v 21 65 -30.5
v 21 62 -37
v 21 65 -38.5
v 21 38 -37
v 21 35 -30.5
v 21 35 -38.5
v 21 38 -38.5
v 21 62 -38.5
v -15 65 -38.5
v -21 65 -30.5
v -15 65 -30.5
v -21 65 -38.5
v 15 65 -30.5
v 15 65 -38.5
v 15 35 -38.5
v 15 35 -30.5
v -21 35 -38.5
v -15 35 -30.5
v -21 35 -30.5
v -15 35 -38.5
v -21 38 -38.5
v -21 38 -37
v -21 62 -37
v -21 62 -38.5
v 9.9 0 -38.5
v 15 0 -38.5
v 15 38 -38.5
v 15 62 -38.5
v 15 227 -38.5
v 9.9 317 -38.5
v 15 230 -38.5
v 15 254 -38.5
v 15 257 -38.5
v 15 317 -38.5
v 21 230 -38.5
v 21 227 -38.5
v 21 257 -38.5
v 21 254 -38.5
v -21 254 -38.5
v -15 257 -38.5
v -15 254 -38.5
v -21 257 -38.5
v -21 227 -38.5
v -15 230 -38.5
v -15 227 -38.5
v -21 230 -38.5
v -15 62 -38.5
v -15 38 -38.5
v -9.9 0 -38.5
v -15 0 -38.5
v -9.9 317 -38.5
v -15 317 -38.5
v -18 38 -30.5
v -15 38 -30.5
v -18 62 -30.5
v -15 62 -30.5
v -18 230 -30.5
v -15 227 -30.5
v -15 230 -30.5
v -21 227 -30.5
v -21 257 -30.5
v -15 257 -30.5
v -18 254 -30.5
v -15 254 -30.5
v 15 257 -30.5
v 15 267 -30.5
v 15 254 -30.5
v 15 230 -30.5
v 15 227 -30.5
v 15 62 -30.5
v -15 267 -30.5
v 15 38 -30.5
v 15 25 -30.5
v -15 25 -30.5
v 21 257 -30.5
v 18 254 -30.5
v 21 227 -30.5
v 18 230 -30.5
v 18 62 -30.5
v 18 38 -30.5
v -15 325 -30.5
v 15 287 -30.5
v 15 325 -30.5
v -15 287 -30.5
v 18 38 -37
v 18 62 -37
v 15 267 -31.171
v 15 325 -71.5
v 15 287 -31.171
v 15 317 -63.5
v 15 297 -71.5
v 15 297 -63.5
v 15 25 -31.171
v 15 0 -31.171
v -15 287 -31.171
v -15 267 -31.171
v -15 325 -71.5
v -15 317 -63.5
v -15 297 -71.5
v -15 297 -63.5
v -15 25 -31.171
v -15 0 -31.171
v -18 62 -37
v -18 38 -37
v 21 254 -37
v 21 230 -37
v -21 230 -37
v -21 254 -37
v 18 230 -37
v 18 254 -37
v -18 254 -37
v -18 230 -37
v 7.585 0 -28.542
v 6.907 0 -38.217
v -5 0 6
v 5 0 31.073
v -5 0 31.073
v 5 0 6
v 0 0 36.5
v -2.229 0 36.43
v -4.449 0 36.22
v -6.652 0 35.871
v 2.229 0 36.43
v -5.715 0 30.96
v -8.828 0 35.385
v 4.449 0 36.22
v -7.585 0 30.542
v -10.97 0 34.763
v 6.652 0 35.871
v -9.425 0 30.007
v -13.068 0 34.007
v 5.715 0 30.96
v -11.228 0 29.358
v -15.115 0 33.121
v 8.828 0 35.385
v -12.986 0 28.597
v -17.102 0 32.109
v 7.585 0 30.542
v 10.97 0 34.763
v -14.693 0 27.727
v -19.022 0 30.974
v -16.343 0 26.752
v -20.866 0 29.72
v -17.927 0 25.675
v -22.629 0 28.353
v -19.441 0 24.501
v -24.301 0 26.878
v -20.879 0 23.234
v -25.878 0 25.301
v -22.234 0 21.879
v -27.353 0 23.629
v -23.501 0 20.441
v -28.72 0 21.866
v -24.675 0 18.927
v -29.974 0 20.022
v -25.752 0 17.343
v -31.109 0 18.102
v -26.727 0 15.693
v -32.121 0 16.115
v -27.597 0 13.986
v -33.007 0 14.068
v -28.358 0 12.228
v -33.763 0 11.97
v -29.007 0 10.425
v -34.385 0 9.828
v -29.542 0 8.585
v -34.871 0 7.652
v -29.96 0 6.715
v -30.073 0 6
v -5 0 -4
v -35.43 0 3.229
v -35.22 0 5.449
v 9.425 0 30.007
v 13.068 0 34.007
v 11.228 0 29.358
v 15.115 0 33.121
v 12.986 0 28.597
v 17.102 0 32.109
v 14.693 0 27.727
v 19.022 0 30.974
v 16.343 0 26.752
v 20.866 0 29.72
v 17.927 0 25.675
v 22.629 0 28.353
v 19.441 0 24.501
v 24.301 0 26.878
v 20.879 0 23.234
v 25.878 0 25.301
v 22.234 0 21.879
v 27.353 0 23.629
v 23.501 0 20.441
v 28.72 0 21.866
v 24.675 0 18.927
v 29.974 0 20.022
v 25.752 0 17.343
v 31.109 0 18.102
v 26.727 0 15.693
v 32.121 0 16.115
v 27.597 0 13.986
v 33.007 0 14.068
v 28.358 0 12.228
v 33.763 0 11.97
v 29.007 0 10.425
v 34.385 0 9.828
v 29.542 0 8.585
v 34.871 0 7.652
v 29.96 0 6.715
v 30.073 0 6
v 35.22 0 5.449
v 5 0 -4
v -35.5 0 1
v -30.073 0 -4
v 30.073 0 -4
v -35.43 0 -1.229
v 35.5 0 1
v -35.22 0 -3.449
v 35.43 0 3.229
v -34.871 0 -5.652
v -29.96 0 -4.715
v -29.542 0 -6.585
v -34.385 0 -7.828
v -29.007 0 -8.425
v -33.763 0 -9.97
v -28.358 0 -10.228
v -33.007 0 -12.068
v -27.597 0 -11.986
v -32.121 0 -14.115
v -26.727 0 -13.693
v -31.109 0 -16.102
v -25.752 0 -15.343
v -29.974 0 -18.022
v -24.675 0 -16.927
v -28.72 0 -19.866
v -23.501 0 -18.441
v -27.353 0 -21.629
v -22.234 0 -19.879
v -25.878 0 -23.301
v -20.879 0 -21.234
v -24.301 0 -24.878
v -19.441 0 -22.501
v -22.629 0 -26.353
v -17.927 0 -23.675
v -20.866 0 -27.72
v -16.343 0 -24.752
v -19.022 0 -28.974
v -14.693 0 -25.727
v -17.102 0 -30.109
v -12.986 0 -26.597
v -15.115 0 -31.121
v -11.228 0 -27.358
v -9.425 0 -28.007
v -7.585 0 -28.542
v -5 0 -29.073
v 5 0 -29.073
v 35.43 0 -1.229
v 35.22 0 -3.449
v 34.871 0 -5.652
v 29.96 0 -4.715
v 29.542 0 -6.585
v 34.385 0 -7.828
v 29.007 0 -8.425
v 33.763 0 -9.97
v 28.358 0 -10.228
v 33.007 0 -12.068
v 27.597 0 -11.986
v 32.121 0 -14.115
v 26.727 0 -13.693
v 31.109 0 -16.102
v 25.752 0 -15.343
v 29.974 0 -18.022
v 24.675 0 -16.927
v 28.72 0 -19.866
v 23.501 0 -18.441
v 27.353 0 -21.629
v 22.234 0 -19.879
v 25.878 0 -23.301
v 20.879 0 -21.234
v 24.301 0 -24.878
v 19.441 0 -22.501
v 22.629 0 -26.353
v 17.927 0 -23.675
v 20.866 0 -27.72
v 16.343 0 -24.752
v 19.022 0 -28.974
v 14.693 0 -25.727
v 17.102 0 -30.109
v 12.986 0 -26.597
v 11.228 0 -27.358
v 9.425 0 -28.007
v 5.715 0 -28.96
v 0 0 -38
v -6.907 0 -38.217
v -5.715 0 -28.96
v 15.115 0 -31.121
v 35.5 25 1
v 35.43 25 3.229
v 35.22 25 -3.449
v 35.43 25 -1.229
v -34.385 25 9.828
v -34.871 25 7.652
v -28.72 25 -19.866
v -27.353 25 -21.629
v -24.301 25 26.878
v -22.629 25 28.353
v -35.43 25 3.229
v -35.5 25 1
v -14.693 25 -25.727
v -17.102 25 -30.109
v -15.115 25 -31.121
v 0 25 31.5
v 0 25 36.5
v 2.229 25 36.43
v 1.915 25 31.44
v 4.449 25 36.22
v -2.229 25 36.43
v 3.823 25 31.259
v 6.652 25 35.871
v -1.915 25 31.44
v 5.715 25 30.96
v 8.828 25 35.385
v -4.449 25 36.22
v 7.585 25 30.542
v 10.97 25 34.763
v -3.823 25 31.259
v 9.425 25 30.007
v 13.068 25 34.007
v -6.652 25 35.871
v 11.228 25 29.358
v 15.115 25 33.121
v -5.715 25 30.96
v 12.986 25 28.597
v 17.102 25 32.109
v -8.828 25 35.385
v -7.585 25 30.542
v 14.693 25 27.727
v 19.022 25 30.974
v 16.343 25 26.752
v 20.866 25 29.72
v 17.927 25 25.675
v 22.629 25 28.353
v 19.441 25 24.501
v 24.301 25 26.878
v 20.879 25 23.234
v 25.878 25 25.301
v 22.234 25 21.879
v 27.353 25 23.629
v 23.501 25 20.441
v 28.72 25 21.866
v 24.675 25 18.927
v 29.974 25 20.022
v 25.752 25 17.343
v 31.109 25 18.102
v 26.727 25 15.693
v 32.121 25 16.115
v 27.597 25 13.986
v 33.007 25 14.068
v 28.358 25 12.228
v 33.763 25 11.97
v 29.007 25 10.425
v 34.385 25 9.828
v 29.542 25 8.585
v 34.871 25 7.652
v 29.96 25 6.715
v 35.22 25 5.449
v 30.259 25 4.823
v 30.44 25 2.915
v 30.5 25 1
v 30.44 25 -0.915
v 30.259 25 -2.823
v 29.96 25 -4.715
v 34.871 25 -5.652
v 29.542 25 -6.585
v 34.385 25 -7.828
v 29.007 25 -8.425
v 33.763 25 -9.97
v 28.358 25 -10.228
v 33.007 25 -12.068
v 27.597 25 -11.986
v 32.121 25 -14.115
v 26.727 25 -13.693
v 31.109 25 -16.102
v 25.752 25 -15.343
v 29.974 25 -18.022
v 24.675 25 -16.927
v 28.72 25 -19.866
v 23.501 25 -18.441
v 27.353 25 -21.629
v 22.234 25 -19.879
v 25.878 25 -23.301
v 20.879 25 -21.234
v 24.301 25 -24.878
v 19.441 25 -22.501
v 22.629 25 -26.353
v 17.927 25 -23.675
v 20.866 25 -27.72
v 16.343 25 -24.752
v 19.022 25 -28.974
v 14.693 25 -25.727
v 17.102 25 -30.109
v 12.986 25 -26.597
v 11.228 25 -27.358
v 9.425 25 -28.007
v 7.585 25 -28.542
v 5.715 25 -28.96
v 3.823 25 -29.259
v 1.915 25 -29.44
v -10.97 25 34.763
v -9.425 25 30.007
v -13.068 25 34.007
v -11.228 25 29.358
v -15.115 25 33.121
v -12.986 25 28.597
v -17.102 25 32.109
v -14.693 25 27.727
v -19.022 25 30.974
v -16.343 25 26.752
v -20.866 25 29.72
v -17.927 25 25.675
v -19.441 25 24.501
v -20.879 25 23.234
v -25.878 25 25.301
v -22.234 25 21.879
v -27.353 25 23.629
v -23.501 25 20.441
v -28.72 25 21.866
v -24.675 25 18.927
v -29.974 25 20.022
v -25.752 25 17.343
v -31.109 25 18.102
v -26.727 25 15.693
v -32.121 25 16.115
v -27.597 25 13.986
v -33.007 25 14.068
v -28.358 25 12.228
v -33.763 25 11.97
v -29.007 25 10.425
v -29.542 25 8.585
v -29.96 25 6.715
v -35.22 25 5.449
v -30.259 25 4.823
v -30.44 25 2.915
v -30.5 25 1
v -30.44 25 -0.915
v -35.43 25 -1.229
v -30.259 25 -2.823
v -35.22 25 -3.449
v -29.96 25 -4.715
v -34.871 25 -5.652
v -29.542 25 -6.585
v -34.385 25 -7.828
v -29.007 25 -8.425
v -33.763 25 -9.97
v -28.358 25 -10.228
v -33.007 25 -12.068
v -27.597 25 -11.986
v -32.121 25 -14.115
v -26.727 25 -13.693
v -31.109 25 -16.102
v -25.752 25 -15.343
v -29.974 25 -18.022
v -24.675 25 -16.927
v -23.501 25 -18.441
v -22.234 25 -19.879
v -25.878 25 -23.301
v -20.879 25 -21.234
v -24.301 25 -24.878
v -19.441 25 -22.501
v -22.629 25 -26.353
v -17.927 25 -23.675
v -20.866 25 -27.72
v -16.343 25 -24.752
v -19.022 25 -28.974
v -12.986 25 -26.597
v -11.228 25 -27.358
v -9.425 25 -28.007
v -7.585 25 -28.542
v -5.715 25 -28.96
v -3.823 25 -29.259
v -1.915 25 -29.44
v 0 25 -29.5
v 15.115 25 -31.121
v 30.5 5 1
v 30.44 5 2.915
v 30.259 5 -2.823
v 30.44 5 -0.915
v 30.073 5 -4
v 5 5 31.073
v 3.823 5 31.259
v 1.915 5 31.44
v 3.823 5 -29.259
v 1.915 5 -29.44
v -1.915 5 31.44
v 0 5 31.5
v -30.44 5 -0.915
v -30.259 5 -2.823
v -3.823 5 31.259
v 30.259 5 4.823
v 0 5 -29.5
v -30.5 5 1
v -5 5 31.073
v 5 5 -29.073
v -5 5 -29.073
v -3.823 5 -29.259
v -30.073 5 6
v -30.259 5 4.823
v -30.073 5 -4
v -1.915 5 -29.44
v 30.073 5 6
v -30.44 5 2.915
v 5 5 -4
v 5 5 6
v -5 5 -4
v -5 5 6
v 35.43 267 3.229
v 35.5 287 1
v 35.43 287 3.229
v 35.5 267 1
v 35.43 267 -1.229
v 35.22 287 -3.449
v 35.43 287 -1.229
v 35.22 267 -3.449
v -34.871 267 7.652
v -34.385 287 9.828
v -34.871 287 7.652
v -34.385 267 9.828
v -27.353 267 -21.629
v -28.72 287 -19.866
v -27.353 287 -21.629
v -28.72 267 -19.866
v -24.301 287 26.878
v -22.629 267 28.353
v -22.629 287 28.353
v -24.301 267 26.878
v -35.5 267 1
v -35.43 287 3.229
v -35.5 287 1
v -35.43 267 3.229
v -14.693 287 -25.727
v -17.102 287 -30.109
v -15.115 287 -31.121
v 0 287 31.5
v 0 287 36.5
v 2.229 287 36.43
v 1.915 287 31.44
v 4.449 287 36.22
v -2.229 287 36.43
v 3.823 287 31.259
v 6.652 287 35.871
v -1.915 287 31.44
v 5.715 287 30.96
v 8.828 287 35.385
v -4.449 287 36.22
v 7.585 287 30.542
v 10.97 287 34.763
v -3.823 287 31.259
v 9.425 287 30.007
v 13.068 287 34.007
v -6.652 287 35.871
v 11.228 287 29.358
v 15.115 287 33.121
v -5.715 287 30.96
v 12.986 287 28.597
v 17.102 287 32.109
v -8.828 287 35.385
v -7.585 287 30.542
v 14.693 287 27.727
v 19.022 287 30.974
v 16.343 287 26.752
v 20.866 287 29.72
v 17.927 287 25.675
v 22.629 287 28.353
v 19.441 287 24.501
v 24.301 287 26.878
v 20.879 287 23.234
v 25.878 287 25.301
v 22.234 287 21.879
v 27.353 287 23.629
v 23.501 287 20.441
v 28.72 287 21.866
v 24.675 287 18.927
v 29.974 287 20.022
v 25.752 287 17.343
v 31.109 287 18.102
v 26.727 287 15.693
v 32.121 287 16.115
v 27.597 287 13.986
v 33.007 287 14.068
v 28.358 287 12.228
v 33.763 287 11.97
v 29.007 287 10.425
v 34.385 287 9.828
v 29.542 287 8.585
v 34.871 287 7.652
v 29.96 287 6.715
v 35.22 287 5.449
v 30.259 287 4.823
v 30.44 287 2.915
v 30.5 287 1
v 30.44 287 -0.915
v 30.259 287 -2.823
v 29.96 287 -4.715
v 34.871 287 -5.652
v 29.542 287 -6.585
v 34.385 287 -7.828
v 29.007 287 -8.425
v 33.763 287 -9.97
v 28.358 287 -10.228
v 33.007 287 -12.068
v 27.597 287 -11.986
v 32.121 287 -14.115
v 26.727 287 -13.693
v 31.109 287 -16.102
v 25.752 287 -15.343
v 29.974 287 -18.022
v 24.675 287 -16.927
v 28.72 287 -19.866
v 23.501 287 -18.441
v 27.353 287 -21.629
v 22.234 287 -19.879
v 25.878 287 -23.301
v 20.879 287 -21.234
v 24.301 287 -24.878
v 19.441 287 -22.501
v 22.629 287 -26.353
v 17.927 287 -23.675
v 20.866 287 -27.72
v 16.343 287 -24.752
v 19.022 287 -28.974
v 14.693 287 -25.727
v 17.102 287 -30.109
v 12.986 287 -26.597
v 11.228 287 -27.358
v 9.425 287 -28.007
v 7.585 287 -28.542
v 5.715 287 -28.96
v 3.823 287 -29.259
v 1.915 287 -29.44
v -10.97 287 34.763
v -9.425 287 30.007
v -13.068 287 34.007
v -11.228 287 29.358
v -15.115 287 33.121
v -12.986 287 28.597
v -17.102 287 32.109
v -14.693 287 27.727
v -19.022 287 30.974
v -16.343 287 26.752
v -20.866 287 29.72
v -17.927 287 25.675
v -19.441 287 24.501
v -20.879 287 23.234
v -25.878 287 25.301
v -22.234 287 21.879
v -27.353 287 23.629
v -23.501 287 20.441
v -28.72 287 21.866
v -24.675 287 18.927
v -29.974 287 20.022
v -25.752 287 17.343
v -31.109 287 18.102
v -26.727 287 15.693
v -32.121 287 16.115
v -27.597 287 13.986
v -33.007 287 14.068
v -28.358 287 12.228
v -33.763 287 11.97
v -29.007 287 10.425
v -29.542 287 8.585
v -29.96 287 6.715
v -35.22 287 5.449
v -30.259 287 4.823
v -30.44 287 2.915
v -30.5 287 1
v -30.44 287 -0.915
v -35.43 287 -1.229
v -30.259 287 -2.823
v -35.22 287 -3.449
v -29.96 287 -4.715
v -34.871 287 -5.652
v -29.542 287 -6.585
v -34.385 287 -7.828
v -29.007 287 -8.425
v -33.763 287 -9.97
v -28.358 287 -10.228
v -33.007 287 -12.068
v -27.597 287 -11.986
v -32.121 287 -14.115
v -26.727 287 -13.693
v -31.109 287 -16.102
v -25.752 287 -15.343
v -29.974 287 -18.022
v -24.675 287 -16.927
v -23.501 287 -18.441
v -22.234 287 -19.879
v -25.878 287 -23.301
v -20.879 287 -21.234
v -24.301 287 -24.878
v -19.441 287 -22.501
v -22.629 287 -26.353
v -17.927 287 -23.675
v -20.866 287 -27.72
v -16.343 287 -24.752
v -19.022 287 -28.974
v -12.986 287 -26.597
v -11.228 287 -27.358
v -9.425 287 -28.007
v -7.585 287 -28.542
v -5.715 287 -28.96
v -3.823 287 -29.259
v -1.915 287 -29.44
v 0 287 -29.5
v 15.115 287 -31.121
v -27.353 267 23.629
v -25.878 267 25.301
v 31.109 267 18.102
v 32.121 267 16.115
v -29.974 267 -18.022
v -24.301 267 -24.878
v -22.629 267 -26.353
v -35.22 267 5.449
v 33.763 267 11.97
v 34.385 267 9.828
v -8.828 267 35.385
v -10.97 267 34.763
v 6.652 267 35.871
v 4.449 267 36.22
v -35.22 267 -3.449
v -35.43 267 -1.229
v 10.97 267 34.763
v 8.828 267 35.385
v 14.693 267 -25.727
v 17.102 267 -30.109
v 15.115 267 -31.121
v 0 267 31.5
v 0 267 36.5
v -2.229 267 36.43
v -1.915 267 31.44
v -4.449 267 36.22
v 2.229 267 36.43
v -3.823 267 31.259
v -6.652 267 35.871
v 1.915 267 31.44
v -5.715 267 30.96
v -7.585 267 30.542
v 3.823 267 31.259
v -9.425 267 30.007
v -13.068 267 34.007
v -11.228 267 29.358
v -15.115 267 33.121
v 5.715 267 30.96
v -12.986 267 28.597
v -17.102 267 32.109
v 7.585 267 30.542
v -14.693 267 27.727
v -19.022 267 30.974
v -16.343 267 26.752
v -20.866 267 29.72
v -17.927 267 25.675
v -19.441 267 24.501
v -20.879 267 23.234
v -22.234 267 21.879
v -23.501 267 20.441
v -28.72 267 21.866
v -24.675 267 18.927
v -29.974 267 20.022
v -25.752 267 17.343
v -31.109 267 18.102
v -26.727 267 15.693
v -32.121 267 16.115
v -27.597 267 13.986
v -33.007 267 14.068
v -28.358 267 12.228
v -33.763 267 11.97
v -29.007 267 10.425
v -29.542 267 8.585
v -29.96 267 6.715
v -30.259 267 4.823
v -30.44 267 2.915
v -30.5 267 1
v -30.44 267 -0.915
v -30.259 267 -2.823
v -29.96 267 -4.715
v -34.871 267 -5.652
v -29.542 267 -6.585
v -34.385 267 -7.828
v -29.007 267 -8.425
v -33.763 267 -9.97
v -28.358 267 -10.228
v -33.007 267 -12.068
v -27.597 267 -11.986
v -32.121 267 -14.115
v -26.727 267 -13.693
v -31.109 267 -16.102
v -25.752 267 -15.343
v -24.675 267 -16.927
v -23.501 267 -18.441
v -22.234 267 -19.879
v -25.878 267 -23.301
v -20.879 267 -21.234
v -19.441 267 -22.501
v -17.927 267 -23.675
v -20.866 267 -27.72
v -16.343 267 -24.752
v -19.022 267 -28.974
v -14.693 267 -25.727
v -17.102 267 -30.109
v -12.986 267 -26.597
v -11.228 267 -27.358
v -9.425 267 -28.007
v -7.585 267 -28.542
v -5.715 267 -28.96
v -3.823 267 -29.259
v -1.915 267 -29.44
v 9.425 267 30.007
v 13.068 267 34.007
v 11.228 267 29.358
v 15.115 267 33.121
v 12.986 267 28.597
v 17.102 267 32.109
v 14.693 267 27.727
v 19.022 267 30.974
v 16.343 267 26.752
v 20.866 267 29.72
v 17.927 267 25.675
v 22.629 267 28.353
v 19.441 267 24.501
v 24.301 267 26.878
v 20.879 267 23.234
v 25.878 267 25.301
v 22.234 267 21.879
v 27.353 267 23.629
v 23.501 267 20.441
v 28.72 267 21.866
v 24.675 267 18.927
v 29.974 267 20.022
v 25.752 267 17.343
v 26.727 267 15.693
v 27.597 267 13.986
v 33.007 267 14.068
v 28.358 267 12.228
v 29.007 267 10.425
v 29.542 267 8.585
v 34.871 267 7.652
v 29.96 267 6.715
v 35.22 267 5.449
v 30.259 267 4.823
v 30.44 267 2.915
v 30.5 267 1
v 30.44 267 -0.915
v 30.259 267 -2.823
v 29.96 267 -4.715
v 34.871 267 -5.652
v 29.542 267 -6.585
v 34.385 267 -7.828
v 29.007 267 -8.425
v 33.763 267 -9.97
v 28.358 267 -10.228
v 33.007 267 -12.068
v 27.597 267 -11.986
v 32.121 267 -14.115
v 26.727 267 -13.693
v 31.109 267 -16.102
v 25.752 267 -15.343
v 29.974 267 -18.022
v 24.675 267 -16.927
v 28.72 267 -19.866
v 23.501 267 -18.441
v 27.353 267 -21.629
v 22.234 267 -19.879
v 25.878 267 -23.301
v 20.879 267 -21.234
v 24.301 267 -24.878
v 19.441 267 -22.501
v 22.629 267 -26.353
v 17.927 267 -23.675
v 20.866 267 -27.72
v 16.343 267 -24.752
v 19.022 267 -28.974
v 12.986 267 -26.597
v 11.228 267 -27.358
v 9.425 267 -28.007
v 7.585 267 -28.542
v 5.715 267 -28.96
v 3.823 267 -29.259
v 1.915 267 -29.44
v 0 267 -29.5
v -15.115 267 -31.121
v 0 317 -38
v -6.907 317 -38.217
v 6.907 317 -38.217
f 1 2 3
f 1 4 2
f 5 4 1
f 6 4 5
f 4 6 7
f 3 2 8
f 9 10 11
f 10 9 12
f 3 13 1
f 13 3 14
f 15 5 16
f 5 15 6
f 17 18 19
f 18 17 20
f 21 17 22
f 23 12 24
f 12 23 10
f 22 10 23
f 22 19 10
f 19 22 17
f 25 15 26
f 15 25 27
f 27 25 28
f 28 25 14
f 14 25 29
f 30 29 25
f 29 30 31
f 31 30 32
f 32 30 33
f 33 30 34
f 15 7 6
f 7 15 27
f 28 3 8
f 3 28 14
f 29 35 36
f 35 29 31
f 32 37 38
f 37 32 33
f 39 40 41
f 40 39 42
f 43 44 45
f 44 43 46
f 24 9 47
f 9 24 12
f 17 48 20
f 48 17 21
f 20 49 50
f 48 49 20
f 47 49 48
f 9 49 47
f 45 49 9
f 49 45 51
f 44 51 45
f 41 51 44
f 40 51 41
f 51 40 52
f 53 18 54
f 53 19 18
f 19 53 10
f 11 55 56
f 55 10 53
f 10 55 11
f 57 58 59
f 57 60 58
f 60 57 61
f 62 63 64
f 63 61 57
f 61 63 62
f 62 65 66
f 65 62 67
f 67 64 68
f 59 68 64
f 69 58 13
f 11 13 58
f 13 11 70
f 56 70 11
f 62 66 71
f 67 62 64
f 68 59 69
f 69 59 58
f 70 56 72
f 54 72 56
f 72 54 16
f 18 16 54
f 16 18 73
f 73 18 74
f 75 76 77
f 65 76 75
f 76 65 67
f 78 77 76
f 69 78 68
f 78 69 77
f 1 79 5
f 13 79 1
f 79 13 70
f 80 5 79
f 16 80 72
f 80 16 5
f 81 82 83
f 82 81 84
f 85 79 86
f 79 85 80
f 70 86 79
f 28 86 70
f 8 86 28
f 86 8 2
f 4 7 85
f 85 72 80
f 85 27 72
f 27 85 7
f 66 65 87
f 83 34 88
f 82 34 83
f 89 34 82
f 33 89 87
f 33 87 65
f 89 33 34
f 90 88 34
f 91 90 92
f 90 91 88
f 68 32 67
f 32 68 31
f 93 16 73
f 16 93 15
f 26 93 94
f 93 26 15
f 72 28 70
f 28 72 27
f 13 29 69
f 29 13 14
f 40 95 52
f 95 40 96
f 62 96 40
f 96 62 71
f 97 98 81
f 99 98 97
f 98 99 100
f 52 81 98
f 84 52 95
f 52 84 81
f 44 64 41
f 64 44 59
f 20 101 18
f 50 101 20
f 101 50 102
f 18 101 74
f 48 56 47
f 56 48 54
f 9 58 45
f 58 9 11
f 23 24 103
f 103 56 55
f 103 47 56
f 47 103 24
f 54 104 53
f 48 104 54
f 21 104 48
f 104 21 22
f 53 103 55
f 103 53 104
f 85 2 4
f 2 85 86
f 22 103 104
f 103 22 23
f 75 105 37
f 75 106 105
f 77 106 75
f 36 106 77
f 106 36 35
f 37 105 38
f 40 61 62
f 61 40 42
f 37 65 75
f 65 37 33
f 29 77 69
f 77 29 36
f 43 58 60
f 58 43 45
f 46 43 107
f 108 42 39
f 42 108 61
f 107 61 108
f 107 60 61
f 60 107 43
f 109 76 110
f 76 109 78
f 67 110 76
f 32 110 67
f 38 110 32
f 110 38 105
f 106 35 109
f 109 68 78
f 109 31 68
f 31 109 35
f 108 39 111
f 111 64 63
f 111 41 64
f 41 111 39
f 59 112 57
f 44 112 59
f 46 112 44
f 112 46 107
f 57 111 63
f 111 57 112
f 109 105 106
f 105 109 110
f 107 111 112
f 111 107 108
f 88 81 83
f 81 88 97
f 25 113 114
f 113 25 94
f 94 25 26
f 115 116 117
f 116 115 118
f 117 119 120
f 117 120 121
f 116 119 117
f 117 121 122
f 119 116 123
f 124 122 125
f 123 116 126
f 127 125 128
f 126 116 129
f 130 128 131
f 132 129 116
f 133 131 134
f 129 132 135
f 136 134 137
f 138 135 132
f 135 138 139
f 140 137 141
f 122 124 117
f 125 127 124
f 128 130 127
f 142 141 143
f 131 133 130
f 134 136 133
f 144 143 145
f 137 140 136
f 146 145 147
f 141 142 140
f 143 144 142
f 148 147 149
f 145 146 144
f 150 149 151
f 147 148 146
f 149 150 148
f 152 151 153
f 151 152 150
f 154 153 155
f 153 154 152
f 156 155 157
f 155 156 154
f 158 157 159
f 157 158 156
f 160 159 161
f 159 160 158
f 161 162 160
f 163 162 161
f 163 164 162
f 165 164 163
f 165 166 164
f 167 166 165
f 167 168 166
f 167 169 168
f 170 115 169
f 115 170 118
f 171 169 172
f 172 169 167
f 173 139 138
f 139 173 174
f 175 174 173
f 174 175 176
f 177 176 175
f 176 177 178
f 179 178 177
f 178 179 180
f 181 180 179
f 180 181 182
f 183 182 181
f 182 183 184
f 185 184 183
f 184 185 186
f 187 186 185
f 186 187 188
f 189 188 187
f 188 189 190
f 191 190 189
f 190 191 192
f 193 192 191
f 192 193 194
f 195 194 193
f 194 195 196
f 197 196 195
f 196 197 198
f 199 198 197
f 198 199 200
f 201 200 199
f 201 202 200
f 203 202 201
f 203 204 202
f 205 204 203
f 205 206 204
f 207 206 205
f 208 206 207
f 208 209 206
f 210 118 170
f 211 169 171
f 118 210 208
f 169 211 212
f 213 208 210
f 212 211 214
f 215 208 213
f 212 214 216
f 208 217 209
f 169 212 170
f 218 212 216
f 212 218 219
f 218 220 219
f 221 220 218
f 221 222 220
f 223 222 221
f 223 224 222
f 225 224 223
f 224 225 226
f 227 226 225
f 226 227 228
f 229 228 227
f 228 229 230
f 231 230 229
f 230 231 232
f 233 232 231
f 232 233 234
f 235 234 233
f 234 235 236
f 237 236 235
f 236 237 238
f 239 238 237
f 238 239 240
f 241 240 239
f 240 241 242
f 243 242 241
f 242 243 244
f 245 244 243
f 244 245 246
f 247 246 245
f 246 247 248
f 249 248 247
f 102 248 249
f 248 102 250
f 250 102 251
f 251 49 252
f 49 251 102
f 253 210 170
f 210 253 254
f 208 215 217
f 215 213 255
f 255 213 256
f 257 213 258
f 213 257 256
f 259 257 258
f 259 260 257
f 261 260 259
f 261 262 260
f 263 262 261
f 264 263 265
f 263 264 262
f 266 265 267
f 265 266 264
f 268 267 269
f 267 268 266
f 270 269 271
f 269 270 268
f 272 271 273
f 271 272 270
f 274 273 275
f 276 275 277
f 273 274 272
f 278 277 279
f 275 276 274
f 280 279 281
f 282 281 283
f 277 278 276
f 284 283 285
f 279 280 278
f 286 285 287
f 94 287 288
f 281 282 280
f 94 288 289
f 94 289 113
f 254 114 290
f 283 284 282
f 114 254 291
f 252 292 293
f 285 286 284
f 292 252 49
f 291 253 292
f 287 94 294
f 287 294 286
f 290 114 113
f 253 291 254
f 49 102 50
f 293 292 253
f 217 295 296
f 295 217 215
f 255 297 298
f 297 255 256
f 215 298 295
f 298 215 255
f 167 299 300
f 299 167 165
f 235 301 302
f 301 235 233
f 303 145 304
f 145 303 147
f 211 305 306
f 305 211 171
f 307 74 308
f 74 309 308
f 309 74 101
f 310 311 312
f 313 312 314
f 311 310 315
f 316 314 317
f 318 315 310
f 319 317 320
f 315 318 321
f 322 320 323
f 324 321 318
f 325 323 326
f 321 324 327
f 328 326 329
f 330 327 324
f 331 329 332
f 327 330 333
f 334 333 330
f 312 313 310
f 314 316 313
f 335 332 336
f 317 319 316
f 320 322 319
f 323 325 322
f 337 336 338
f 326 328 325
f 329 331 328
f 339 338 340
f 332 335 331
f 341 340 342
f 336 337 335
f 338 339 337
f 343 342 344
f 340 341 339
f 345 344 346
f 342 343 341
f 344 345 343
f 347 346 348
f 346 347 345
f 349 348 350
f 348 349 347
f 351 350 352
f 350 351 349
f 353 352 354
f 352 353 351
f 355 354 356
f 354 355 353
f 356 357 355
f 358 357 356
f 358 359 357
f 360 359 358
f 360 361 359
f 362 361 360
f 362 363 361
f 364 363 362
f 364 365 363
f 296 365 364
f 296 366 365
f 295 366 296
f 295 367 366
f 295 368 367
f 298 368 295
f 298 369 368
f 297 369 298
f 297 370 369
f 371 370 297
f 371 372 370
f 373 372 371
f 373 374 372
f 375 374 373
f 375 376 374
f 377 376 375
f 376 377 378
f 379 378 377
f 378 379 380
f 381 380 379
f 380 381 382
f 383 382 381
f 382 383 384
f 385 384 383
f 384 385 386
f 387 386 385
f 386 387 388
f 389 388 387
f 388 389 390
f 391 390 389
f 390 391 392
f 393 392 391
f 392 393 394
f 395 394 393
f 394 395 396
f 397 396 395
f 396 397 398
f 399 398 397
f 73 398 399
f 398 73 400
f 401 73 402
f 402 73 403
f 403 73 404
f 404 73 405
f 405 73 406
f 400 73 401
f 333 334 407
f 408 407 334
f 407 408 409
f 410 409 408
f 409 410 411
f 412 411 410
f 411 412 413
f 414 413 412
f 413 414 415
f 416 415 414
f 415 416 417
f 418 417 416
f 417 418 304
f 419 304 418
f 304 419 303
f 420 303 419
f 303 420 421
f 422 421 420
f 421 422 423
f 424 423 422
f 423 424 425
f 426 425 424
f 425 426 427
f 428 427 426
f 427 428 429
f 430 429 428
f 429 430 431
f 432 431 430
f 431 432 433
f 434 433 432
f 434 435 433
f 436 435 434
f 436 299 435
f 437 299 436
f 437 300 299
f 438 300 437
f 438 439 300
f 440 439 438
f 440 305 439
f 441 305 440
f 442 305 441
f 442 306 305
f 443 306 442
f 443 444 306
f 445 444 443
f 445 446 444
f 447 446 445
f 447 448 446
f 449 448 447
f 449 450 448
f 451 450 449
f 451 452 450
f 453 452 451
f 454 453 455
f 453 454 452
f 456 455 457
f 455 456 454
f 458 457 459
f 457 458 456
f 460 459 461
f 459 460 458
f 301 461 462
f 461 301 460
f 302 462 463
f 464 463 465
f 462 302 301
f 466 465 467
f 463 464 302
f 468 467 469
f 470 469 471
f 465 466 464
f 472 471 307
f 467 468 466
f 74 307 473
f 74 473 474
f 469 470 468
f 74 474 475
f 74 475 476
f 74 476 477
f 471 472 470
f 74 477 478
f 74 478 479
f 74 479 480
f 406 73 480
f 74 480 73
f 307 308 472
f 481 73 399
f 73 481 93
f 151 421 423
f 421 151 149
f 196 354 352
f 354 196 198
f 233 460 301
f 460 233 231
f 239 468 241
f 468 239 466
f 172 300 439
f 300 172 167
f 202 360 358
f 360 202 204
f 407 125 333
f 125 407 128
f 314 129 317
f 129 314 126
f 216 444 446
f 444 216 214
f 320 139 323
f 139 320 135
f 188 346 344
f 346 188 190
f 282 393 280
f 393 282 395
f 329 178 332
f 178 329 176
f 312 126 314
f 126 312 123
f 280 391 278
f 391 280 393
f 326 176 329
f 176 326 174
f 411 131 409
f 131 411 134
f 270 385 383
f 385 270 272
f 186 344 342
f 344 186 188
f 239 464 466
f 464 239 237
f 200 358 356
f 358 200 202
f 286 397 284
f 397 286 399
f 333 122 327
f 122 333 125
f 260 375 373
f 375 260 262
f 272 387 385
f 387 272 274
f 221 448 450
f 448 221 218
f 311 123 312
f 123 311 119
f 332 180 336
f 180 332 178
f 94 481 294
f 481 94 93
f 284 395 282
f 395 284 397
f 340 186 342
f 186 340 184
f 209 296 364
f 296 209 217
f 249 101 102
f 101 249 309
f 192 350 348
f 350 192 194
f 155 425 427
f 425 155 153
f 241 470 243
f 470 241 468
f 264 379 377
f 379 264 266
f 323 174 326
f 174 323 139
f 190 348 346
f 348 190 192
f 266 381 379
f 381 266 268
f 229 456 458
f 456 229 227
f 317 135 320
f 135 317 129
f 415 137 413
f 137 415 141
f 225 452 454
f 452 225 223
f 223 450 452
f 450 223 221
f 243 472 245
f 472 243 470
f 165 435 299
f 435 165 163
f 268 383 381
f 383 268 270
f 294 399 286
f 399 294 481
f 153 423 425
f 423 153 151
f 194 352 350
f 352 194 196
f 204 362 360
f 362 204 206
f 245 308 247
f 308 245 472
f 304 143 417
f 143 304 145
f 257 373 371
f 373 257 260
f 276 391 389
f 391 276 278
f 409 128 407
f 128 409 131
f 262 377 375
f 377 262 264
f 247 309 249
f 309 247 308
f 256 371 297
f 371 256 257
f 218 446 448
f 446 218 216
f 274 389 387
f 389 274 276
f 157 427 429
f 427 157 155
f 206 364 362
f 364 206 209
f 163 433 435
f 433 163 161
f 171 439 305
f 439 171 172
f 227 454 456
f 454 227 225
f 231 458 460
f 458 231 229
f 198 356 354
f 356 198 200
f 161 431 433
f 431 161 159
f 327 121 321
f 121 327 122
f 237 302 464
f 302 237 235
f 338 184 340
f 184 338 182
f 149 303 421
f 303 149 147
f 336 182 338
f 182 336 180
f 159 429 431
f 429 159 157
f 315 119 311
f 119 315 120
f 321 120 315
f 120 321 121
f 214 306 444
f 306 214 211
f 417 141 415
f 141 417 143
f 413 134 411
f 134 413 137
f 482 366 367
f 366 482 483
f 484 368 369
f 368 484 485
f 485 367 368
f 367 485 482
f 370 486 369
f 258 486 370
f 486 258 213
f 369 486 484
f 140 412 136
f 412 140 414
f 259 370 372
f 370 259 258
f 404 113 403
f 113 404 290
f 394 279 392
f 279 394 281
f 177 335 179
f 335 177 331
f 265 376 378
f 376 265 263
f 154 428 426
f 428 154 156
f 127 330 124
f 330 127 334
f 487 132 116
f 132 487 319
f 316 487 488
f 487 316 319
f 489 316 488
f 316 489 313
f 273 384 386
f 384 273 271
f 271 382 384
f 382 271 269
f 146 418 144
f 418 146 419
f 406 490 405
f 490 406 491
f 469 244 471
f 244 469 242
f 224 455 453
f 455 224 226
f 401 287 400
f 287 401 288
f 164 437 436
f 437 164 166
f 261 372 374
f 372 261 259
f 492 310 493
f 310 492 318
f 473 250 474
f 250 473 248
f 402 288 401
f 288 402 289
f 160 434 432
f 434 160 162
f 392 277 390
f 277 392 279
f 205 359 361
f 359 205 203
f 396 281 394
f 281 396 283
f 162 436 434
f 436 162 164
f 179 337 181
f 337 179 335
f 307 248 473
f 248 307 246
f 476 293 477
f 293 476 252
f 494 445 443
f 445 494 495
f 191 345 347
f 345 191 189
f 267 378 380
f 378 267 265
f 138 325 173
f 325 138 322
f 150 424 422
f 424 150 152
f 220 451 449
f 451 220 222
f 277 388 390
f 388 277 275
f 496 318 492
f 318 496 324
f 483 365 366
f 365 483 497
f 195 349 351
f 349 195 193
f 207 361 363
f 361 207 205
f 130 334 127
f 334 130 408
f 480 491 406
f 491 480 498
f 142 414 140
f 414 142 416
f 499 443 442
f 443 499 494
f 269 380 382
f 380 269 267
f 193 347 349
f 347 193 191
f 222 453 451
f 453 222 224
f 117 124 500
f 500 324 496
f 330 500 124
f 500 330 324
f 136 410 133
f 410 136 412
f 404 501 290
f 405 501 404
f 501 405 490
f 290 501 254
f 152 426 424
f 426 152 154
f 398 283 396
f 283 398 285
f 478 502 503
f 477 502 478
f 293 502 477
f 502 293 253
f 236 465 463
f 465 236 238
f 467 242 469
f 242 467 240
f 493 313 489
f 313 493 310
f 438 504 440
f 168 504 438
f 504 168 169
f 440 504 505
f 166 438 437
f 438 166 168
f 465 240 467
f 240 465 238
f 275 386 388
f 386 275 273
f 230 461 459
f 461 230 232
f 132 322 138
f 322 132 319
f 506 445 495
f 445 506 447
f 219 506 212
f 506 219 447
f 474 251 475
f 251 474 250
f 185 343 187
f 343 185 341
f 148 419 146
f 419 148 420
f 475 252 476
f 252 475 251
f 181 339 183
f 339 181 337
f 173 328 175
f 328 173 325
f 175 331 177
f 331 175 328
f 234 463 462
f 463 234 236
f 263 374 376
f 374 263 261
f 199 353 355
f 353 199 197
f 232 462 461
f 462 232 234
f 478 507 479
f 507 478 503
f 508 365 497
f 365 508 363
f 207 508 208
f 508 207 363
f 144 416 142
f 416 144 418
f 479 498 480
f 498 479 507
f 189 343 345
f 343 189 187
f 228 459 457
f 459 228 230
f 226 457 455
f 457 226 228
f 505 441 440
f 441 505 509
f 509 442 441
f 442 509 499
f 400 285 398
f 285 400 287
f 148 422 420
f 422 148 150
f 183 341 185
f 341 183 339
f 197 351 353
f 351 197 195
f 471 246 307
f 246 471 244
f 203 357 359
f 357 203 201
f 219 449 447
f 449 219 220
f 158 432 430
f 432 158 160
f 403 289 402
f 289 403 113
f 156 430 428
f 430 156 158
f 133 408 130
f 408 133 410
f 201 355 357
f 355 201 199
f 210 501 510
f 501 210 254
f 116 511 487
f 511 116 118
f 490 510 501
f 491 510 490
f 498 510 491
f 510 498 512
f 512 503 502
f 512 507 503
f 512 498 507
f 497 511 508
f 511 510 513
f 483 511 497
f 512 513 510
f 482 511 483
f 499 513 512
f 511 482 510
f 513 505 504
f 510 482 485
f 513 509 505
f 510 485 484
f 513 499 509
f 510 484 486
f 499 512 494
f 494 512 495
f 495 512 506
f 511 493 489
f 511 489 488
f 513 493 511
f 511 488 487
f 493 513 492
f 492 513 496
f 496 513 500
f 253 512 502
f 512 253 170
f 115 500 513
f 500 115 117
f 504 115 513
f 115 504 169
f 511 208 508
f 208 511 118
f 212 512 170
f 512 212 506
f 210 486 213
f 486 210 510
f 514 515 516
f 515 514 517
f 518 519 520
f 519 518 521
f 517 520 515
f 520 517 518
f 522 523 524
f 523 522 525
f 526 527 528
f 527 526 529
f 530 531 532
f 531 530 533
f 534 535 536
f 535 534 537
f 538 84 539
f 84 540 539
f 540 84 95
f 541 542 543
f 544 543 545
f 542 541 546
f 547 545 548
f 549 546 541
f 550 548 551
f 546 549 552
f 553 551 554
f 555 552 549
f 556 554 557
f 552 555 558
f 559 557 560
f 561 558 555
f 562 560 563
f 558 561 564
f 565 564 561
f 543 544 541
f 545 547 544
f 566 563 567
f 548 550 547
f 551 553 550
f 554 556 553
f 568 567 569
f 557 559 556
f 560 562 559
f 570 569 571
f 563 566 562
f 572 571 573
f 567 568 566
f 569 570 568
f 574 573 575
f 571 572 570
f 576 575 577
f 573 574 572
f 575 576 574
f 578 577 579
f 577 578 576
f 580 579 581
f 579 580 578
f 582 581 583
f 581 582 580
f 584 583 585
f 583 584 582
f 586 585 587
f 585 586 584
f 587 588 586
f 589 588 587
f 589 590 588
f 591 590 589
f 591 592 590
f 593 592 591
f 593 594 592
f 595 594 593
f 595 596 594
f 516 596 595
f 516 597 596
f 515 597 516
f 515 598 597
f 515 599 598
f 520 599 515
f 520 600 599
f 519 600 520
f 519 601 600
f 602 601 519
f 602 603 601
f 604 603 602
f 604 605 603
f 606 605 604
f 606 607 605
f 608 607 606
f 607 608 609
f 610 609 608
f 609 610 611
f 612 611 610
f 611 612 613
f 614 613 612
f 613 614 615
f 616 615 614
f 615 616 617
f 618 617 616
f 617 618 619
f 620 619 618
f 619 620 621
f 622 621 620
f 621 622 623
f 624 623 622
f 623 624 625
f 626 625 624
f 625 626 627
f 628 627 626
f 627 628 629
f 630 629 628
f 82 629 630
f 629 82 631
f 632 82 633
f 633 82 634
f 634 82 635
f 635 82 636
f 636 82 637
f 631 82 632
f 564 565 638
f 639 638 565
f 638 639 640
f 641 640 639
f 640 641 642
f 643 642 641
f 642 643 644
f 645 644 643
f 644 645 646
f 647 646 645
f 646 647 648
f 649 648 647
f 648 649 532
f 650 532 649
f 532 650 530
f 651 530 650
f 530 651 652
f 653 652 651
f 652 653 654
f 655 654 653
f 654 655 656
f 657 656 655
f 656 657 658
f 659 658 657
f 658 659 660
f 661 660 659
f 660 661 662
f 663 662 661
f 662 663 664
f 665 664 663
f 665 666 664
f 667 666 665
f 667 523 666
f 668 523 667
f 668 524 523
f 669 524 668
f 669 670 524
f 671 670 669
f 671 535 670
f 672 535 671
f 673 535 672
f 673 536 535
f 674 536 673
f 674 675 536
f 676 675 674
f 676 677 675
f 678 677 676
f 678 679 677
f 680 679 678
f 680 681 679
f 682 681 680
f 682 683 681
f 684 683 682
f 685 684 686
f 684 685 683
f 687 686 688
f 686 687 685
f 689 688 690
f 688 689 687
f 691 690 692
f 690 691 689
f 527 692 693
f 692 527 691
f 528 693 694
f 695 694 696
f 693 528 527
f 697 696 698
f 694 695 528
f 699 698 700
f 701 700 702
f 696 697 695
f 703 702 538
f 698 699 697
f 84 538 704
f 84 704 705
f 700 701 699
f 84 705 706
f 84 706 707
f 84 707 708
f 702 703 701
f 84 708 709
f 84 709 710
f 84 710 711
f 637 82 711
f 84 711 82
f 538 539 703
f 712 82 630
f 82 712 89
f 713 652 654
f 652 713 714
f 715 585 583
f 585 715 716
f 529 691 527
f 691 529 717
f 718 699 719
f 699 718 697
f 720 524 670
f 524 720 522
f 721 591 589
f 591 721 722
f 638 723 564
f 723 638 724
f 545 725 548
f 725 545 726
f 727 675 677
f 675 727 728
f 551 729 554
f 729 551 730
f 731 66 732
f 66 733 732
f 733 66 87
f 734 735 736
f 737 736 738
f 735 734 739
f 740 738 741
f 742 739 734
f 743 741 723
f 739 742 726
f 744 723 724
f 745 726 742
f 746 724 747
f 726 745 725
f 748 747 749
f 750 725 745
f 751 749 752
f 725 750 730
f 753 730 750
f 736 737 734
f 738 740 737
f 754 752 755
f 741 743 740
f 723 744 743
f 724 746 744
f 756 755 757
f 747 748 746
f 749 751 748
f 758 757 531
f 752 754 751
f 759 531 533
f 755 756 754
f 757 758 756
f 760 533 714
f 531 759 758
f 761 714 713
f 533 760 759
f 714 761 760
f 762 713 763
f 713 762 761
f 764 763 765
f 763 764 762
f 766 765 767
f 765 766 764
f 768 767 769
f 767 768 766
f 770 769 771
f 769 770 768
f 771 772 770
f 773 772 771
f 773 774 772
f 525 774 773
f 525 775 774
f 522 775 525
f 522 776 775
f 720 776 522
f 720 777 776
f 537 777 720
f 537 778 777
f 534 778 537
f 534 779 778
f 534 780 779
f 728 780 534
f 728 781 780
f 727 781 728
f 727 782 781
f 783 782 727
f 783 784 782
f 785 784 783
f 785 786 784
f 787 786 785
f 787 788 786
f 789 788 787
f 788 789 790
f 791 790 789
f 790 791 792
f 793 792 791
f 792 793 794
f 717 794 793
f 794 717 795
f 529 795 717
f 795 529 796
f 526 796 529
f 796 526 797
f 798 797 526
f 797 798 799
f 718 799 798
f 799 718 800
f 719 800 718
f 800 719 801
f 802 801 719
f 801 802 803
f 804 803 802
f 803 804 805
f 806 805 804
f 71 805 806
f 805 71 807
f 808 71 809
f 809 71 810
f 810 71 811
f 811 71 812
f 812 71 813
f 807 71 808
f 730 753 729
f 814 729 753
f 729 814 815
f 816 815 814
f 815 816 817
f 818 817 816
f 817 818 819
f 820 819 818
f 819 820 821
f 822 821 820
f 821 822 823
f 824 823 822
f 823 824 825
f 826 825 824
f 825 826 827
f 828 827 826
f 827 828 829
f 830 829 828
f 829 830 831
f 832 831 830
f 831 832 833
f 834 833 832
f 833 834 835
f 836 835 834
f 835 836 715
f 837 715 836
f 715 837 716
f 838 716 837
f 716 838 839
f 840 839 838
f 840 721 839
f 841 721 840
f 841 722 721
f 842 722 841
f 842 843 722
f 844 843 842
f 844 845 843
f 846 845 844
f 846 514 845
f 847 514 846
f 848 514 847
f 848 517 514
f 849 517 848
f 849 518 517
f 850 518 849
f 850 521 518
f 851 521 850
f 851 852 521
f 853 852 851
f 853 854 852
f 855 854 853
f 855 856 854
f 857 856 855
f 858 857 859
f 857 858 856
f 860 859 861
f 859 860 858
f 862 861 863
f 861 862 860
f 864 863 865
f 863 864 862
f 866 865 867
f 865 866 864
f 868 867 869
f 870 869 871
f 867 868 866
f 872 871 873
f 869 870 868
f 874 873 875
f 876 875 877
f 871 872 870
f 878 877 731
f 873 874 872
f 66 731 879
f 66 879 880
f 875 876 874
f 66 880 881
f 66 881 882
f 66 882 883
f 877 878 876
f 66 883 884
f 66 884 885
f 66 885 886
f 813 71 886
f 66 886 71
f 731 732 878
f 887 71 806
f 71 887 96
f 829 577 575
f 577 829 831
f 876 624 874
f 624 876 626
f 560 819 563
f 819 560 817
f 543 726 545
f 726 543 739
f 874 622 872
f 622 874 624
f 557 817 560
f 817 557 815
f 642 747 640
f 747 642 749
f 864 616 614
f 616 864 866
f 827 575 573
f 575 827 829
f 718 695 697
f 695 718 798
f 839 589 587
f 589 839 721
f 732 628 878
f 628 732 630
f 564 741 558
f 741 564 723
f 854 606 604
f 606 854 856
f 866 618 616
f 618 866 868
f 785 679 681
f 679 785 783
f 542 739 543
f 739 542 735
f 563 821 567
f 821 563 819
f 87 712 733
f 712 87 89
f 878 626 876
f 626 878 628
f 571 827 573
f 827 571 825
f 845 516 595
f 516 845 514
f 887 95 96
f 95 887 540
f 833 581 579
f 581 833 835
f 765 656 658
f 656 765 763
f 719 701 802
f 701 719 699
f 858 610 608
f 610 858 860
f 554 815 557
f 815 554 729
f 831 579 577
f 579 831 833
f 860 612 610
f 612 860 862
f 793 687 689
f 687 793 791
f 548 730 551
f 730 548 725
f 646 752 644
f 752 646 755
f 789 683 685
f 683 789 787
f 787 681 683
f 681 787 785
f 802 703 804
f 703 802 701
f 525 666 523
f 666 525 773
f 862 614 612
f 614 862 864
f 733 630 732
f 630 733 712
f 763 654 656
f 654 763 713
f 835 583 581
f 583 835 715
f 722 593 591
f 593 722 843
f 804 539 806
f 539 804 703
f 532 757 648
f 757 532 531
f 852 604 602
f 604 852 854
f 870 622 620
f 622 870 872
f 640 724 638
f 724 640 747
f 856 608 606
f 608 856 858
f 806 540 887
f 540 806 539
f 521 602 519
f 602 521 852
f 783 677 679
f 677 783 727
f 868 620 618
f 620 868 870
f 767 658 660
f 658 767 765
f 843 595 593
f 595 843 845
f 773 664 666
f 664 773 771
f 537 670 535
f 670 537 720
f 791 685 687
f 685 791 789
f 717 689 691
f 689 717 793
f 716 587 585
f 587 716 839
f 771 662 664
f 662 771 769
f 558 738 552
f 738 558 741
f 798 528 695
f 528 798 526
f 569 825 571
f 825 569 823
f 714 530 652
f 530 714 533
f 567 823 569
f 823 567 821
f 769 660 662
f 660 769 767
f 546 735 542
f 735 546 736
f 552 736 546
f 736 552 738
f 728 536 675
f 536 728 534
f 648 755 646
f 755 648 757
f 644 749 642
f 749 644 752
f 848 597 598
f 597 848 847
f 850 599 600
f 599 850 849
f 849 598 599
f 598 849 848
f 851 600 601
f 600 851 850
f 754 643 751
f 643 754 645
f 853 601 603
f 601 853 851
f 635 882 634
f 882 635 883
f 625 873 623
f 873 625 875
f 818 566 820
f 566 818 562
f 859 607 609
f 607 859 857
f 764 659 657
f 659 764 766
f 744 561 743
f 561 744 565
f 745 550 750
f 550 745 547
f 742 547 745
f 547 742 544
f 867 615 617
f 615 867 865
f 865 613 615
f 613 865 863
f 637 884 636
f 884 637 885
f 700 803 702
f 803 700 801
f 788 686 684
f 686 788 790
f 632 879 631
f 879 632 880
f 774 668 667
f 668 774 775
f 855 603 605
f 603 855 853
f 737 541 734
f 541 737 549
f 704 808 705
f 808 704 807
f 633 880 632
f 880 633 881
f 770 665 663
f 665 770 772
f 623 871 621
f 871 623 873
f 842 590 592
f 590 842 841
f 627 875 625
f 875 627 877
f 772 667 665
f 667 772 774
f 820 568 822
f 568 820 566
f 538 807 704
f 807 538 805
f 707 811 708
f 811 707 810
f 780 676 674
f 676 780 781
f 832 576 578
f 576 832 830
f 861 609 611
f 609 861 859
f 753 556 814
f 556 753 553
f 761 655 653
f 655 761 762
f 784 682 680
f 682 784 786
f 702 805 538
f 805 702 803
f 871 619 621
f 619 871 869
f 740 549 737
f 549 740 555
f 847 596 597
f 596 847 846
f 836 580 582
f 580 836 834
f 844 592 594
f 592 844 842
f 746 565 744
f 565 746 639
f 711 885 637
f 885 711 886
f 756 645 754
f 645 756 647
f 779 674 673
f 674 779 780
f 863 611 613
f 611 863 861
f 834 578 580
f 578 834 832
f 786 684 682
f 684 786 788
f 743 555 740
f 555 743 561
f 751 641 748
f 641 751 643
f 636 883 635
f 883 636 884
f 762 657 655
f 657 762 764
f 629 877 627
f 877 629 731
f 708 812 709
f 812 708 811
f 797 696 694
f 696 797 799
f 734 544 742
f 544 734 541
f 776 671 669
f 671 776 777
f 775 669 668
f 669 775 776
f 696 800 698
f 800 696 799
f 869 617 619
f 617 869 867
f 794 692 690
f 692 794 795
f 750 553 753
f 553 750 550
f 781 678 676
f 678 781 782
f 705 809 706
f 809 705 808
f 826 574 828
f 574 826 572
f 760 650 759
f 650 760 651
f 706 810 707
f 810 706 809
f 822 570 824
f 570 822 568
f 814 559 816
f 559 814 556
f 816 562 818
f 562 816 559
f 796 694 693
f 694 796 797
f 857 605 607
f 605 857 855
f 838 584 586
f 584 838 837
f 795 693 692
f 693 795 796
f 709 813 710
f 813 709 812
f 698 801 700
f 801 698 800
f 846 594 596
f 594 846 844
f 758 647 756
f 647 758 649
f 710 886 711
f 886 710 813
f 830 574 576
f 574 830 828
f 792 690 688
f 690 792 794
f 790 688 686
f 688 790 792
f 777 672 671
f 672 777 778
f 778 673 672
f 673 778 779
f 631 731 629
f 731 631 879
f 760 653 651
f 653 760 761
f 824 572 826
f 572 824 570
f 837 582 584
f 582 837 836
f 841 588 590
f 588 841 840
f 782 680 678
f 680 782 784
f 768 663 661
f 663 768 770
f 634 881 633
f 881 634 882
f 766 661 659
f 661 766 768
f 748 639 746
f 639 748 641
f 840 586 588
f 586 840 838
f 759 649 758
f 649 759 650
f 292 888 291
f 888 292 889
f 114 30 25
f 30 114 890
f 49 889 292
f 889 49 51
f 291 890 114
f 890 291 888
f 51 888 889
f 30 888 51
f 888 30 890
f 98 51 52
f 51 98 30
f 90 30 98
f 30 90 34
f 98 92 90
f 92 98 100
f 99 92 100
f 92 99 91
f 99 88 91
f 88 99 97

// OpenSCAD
// Customizable Sodastream bottle holder for Cornelius kegs
// Copyright: Olle Wreede 2019
// License: CC BY-SA

//CUSTOMIZER VARIABLES

/* [Holder] */

// Thickness in mm of the holder connecting the collars
thickness_of_holder = 8; // [5:10]

// Width in mm of the holder connecting the collars
width_of_holder = 30; // [10:50]

// This is the total height in mm of the holder
height_of_holder = 325; // [175:350]

/* [Collars] */

// Position in mm of upper collar
upper_collar_position = 267; // [150:300]

// The height in mm of each collar around the Sodastream bottle
height_of_collars = 20; // [10:50]

// Thickness in mm of collar walls
thickness_of_collars = 5; // [3:10]

// Thickness in mm of the cross at the bottom of the base collar
thickness_of_bottom = 5; // [3:10]

// Width in mm of the Sodastream bottle
inner_width_of_collars = 60; // [60:70]

// Width in mm of support struts in base collar
base_support_width = 10; // [5:0.5:15]

/* [Hook] */

// Depth in mm of the hook at the top
depth_of_hook = 25; // [10:40]

// Height in mm of the hook from the top
height_of_hook = 20; // [5:30]

/* [Buckles] */

// Height in mm of the strap buckles
height_of_buckle = 30; // [20:50]

// Position in mm of lower buckle
lower_buckle_position = 50; // [25:150]

// Position in mm of upper buckle
upper_buckle_position = 242; // [150:250]

//CUSTOMIZER VARIABLES END

/* [Hidden] */

$fn=100;

BASE_WIDTH = inner_width_of_collars + 1; // Adding some tolerance
OUTER_DIAMETER = BASE_WIDTH + thickness_of_collars * 2;
HOLDER_POSITION = BASE_WIDTH / 2 + thickness_of_holder / 2;

KEG_RADIUS = 110;
// Todo select between different keg radius versions

STRAP_BUCKLE_WALL = 3;
STRAP_THICKNESS = 3;
STRAP_WIDTH = height_of_buckle - STRAP_BUCKLE_WALL * 2;
STRAP_BUCKLE_WIDTH = width_of_holder + STRAP_THICKNESS * 2 + STRAP_BUCKLE_WALL * 2;

// Hanger
module hanger() {
    translate([0, HOLDER_POSITION, height_of_holder / 2]) {
        cube(size = [width_of_holder, thickness_of_holder, height_of_holder], center = true);
    }
    
    // Lower strap buckle
    translate([0, HOLDER_POSITION, lower_buckle_position]) {
        strap_buckle();
    }

    // Upper strap buckle
    translate([0, HOLDER_POSITION, upper_buckle_position]) {
        strap_buckle();
    }
}

module base_collar() {
     difference() {
        cylinder(h=thickness_of_bottom + height_of_collars, d=OUTER_DIAMETER);
        cylinder(h=height_of_collars * 2, d=BASE_WIDTH);
     }

 }
module base() {
    base_collar();
    
    // Base supports
    translate([0, 0, thickness_of_bottom / 2]) {
        cube([base_support_width, BASE_WIDTH + thickness_of_collars, thickness_of_bottom], center=true);
        rotate([0, 0, 90])
            cube([base_support_width, BASE_WIDTH + thickness_of_collars, thickness_of_bottom], center=true);
    }
}

module upper_collar() {
    translate([0, 0, upper_collar_position]) {
        difference() {
            cylinder(h=height_of_collars, d=OUTER_DIAMETER);
            cylinder(h=height_of_collars, d=BASE_WIDTH);
        }
    }    
}

module strap_buckle() {
    difference() {
        cube([STRAP_BUCKLE_WIDTH, thickness_of_holder, height_of_buckle], center=true);

        // Strap holes
        translate([width_of_holder / 2 + STRAP_THICKNESS / 2, 0, 0]) {
            cube([STRAP_THICKNESS, thickness_of_holder, STRAP_WIDTH], center = true);
        }
        translate([0 - (width_of_holder / 2 + STRAP_THICKNESS / 2), 0, 0 ]) {
            cube([STRAP_THICKNESS, thickness_of_holder, STRAP_WIDTH], center = true);
        }
        
        // Make room for straps behind buckle
        strap_hole_pos = thickness_of_holder / 2 - STRAP_THICKNESS / 2 + 1;
        translate([width_of_holder / 2 + STRAP_THICKNESS, strap_hole_pos, 0]) {
            cube([STRAP_BUCKLE_WALL * 2, 2, STRAP_WIDTH], center = true);
        }
        translate([0 - (width_of_holder / 2 + STRAP_THICKNESS), strap_hole_pos, 0]) {
            cube([STRAP_BUCKLE_WALL * 2, 2, STRAP_WIDTH], center = true);
        }
    }
}

module hook() {
    // Horizontal lip
    translate([0, (BASE_WIDTH + depth_of_hook) / 2 + thickness_of_holder, height_of_holder - thickness_of_holder / 2]) {
        cube([width_of_holder, depth_of_hook, thickness_of_holder], center = true);
    }
    
    // Vertical hook
    translate([0, BASE_WIDTH / 2 + depth_of_hook + thickness_of_holder * 1.5, height_of_holder - height_of_hook / 2 - thickness_of_holder / 2]) {
        cube([width_of_holder, thickness_of_holder, height_of_hook + thickness_of_holder], true);
    } 
}

module holder() {
    hanger();
    translate([0, -1, 0]) base();
    translate([0, -1, 0]) upper_collar();
}

module drawHolder() {
    // Curved back of holder
    difference() {
        holder();
        
        // Make back rounded to fit keg
        translate([0, BASE_WIDTH / 2 + thickness_of_holder + KEG_RADIUS - 0.5, 0]) {
            cylinder(h=height_of_holder - thickness_of_holder, r=KEG_RADIUS, center=false);
        }
    }

    // Add hook (outside of holder, to not be in the way for the curved back)
    hook();
}

module rotatedHolder() {
    //translate([0, 0, - OUTER_DIAMETER / 2])
        rotate([-90, 0, 0])
            drawHolder();
}

rotatedHolder();
//drawHolder();
